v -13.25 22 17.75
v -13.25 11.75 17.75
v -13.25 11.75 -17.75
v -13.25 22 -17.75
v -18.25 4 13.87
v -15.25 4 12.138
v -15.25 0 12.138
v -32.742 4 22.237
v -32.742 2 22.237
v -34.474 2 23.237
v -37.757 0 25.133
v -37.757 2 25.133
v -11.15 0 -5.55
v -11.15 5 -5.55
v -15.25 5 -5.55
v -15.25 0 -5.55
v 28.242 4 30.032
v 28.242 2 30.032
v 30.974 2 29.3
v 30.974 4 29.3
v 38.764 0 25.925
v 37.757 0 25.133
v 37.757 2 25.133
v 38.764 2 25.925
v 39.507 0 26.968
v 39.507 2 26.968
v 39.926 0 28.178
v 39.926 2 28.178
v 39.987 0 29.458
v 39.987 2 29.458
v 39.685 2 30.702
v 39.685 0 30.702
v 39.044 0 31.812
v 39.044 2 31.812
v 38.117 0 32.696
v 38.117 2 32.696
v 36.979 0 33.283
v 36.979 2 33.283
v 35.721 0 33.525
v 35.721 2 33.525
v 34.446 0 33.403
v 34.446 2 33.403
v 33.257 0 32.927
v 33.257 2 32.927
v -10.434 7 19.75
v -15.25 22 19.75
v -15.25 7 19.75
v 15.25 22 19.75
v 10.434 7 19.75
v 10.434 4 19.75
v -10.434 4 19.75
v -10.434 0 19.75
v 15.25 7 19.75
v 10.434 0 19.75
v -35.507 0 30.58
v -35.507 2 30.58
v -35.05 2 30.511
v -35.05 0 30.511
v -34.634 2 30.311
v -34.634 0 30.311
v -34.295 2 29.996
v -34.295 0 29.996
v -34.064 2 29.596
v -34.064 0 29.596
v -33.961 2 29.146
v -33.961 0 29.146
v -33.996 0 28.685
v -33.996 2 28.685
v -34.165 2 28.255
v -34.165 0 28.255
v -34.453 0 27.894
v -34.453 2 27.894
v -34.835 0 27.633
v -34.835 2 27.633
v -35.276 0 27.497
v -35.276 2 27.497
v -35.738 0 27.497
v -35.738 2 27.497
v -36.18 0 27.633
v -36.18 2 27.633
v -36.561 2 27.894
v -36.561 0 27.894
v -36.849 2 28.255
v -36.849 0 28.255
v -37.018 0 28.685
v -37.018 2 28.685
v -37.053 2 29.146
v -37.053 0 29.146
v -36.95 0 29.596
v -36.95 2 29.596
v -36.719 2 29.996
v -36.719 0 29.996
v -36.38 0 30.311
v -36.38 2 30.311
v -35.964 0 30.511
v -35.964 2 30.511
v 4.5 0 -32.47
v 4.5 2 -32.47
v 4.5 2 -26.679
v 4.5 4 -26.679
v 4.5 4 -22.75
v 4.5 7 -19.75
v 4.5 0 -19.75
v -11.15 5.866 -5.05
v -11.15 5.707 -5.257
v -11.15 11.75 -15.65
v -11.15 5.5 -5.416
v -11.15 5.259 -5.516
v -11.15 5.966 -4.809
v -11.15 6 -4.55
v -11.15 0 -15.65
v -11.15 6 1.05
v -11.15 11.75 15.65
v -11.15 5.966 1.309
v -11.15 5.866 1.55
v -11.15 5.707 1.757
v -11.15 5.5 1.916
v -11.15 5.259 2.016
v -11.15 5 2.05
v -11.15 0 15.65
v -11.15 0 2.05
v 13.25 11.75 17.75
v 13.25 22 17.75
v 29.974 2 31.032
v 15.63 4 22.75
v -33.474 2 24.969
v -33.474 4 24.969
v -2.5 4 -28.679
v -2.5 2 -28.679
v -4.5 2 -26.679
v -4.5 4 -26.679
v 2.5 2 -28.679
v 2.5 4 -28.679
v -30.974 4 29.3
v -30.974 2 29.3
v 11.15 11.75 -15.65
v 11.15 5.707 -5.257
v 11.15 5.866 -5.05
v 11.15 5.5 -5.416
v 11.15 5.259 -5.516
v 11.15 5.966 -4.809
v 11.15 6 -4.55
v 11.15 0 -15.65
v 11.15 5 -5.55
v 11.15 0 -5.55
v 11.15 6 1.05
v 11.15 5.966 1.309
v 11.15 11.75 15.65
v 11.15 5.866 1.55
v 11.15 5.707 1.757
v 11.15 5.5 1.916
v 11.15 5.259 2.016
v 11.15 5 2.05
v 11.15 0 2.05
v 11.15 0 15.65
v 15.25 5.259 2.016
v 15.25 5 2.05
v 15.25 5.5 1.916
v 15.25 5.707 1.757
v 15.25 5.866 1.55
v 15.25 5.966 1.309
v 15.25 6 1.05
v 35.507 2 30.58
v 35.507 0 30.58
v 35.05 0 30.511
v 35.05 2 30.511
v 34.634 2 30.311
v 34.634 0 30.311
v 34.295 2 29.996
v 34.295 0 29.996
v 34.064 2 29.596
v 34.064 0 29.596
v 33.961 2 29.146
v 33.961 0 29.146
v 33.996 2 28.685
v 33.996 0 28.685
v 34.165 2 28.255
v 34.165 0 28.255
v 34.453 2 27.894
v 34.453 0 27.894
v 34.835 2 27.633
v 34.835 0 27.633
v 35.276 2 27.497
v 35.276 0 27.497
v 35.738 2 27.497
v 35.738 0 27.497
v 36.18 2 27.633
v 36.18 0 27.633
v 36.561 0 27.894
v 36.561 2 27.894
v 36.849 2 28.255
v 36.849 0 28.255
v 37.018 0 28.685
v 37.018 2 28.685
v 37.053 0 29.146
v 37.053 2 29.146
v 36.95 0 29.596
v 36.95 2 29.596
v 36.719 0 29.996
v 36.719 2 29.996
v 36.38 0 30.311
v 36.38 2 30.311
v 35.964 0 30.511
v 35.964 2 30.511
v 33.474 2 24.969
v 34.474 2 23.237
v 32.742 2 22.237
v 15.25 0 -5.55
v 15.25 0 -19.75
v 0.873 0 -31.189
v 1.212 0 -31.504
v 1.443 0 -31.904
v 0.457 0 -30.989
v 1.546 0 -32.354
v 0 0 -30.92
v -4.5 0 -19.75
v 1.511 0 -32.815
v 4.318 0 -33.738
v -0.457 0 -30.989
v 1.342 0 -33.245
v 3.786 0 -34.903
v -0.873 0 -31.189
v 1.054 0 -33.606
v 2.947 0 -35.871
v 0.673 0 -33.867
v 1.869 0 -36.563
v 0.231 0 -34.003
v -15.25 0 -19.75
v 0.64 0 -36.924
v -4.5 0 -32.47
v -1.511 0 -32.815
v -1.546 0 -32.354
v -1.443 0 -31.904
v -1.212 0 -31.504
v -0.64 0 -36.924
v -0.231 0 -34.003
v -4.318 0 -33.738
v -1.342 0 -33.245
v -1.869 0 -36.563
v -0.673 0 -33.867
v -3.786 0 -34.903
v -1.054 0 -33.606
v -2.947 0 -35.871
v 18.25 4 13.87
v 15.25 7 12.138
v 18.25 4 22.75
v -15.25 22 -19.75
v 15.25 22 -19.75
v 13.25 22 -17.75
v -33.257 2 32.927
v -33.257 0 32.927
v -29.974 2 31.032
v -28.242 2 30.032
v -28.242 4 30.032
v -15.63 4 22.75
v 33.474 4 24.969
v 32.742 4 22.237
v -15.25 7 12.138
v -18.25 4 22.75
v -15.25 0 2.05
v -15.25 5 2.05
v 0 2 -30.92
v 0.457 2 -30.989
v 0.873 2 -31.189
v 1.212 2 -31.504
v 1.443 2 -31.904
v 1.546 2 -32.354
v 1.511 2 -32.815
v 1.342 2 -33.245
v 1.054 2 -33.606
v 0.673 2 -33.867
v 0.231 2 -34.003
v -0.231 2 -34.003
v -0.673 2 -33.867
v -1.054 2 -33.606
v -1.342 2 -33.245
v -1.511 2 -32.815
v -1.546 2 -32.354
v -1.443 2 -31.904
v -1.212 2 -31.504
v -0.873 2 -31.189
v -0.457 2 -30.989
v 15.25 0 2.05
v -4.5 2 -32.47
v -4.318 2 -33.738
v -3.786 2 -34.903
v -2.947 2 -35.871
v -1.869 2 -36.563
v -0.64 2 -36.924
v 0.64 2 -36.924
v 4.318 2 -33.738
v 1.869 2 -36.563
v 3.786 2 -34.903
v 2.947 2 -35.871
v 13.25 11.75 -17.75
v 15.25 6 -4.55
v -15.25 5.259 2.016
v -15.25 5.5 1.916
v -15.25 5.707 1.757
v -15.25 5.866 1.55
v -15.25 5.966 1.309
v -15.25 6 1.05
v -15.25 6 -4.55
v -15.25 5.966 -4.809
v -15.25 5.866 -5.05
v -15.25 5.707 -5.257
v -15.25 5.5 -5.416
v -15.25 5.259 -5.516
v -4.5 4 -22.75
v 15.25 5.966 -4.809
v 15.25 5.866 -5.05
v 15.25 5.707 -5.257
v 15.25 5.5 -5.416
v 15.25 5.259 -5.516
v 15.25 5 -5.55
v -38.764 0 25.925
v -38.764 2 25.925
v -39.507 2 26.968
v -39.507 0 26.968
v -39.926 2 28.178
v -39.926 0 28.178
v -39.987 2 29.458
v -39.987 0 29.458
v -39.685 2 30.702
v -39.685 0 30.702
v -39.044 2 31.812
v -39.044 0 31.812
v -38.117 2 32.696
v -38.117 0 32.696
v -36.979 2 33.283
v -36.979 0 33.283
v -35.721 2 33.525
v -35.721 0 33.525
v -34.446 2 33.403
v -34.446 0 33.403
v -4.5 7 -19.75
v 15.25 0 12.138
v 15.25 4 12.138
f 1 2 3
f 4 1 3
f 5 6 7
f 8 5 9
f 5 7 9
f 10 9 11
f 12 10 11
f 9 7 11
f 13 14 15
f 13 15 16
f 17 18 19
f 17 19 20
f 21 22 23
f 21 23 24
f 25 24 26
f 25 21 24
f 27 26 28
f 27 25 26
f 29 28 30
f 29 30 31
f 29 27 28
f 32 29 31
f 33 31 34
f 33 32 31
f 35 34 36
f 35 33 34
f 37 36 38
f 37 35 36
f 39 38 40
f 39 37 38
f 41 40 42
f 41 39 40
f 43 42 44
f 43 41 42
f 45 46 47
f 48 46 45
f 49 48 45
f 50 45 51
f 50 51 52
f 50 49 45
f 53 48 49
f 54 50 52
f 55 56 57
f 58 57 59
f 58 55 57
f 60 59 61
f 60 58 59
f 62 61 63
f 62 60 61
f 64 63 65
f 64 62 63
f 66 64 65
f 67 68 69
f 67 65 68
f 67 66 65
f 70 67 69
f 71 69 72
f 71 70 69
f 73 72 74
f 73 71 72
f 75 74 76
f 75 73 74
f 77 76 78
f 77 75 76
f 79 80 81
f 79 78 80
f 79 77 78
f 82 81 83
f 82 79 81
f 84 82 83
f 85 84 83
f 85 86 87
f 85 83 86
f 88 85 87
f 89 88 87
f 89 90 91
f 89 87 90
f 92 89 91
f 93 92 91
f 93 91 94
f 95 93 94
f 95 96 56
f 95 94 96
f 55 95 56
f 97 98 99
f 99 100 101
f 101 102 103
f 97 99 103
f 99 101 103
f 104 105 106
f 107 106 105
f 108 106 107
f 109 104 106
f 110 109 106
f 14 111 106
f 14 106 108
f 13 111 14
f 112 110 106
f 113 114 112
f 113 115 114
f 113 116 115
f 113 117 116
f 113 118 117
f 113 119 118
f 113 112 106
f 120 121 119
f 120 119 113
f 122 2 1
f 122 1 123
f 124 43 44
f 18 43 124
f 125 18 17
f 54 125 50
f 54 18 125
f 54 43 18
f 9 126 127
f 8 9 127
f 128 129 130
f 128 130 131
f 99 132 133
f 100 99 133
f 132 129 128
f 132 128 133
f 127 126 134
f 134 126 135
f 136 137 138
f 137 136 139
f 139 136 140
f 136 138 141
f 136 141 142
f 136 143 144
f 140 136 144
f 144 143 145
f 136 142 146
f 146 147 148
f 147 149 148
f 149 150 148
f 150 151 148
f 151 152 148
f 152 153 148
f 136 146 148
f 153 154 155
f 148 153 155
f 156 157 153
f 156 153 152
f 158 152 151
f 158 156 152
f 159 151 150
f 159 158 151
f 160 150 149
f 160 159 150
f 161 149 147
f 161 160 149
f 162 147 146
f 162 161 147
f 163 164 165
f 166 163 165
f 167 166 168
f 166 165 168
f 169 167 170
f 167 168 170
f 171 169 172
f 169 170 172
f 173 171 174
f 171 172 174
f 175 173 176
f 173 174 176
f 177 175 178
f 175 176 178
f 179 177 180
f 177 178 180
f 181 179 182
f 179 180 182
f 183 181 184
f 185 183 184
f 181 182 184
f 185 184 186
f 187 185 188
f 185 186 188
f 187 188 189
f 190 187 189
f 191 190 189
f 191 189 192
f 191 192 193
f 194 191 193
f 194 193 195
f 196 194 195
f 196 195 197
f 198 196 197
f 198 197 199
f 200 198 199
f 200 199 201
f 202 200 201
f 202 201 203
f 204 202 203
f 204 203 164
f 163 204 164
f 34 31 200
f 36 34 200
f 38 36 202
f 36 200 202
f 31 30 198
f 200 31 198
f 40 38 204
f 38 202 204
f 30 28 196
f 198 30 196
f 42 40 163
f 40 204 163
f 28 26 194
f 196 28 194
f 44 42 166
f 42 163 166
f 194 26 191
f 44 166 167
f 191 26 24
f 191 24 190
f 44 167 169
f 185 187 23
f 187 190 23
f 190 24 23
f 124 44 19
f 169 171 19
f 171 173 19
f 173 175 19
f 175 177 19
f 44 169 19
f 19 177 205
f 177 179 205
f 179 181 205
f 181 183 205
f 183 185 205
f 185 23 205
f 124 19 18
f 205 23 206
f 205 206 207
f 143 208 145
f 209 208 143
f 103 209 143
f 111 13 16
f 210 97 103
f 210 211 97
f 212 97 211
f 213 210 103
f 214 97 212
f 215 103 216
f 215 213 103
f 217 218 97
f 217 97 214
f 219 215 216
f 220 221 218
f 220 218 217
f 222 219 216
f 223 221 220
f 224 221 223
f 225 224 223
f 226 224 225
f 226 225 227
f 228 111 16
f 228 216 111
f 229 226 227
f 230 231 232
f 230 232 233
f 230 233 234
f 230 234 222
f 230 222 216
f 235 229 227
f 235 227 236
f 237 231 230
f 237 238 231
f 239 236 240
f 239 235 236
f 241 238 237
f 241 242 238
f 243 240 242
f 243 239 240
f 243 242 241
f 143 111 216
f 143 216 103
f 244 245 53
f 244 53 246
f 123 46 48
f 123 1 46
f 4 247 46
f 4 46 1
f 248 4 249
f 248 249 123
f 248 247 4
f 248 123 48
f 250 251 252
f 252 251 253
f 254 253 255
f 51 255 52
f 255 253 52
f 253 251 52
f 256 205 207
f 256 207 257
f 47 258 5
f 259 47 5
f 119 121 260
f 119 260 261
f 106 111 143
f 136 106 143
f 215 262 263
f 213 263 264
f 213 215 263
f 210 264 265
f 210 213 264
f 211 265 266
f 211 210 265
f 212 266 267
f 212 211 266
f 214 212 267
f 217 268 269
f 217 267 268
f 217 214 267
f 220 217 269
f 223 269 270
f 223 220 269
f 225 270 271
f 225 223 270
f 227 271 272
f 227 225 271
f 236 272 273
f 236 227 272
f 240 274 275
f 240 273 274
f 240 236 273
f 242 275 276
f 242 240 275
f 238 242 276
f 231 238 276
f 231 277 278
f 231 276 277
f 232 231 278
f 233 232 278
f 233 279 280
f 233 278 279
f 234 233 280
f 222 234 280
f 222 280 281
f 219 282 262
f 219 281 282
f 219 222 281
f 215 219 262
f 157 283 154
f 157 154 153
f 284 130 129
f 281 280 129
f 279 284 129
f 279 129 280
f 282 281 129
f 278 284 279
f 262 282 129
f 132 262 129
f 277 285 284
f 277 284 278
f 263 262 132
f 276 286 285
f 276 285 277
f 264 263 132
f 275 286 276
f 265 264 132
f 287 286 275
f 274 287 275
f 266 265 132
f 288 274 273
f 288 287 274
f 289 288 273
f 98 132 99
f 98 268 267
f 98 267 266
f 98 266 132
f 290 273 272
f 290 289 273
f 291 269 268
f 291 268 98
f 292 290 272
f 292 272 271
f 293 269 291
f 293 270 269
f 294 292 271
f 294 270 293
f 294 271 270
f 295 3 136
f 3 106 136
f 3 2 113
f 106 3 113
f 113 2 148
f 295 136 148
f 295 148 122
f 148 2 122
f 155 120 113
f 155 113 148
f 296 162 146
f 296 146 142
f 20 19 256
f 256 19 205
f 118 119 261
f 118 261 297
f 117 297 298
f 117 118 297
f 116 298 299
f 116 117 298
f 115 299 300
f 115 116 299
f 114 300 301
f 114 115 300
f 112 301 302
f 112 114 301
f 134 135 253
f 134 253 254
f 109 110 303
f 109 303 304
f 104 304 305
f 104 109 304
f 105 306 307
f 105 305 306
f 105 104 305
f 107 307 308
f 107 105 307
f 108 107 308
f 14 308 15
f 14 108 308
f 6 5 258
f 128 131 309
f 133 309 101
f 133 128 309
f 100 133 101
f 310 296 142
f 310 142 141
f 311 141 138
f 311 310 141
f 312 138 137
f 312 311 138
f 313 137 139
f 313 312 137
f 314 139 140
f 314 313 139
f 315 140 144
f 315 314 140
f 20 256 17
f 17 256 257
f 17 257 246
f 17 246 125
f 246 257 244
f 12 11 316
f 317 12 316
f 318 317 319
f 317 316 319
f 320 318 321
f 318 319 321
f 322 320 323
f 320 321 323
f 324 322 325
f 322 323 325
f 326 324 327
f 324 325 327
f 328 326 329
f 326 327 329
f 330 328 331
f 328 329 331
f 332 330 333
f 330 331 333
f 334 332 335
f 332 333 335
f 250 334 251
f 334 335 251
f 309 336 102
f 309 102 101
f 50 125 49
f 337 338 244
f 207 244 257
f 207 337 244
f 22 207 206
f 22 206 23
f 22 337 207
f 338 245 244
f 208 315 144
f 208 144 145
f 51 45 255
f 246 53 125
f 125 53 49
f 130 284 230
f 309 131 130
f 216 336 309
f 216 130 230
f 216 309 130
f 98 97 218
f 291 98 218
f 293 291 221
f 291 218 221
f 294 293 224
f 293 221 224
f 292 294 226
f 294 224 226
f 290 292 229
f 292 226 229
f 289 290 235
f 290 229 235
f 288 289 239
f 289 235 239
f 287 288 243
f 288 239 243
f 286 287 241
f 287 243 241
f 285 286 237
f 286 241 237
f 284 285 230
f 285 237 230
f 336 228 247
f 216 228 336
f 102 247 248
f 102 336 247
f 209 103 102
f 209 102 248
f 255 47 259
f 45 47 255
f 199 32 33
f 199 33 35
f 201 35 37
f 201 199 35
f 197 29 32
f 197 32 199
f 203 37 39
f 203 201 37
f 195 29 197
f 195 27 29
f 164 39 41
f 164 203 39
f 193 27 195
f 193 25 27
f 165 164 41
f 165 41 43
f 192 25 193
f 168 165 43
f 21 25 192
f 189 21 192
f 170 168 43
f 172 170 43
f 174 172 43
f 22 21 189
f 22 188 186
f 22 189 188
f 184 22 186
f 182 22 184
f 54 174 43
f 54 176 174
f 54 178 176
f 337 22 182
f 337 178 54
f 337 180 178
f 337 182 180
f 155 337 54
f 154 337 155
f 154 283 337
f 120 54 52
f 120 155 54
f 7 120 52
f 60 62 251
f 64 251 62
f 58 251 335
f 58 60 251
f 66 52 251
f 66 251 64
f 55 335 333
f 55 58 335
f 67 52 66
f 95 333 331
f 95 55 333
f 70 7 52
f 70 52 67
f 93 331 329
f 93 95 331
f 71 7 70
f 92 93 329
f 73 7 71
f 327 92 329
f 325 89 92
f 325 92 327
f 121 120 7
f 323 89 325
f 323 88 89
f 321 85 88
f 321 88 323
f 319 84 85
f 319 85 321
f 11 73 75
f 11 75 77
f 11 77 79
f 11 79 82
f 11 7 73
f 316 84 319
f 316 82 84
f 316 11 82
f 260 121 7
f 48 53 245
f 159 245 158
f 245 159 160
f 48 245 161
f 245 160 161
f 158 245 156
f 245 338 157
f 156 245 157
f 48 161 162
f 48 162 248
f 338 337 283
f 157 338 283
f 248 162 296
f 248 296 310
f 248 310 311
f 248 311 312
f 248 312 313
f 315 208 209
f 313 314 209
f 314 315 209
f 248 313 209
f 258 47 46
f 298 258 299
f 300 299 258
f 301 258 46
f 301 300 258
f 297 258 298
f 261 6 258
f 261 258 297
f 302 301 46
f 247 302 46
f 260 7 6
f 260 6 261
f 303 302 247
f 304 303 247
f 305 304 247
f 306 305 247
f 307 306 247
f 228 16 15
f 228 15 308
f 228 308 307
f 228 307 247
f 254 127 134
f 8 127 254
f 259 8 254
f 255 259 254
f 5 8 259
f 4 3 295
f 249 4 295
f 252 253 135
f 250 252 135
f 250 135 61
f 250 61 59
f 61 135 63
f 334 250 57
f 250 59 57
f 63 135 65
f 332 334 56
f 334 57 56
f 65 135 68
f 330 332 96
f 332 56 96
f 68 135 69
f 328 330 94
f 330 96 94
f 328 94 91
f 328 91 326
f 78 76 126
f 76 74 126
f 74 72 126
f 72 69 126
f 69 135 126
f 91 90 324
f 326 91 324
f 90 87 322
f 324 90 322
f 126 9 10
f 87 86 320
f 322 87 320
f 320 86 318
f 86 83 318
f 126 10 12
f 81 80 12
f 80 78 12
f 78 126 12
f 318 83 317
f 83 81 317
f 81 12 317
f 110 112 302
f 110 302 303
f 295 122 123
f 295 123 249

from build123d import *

# Parameters (mm, degrees)
SKETCH1_W           = 30.5
SKETCH1_H           = 39.5
SKETCH1_W_2         = 26.5
SKETCH1_H_2         = 35.5
BOSS_EXTRUDE1_DEPTH = 22
SKETCH3_W           = 26.5
SKETCH3_H           = 35.5
SKETCH3_W_2         = 22.3
SKETCH3_H_2         = 31.3
BOSS_EXTRUDE3_DEPTH = 11.75
BOSS_EXTRUDE4_START = -22
SKETCH4_R           = 1.55
BOSS_EXTRUDE4_DEPTH = 4
CUT_EXTRUDE1_DEPTH  = 2
CHAMFER2_SIZE       = 3
CUT_EXTRUDE2_DEPTH  = 71.029433394
CUT_EXTRUDE3_START  = -2
CUT_EXTRUDE3_DEPTH  = 2
CHAMFER3_SIZE       = 2


with BuildPart() as part:
    # Sketch1 → Boss-Extrude1 (new body)
    with BuildSketch(Plane(origin=(0, 0, 0), x_dir=(1, 0, 0), z_dir=(0, 1, 0))):
        Rectangle(SKETCH1_W, SKETCH1_H)
        Rectangle(SKETCH1_W_2, SKETCH1_H_2, mode=Mode.SUBTRACT)
    extrude(amount=BOSS_EXTRUDE1_DEPTH)

    # Sketch3 → Boss-Extrude3 (add)
    with BuildSketch(Plane.XZ):
        Rectangle(SKETCH3_W, SKETCH3_H)
        Rectangle(SKETCH3_W_2, SKETCH3_H_2, mode=Mode.SUBTRACT)
    extrude(amount=-BOSS_EXTRUDE3_DEPTH)

    # Sketch4 → Boss-Extrude4 (add)
    # profile 1 of 2: a face of its own
    with BuildSketch(Plane(origin=(0, 22, 0), x_dir=(1, 0, 0), z_dir=(0, 1, 0)).offset(BOSS_EXTRUDE4_START)):
        with BuildLine():
            Line((-33.257041555, -32.927114317), (-10.433610061, -19.75))
            Line((-10.433610061, -19.75), (-15.25, -19.75))
            Line((-15.25, -19.75), (-15.25, -12.138439182))
            Line((-15.25, -12.138439182), (-37.757041555, -25.132885683))
            ThreePointArc((-37.757041555, -25.132885683), (-39.404155872, -31.28), (-33.257041555, -32.927114317))
        make_face()
        with Locations(Location((-35.507041555, -29.03, 0), (0, 0, 270))):
            Circle(SKETCH4_R, mode=Mode.SUBTRACT)
    # profile 2 of 2: a face of its own
    with BuildSketch(Plane(origin=(0, 22, 0), x_dir=(1, 0, 0), z_dir=(0, 1, 0)).offset(BOSS_EXTRUDE4_START)):
        with BuildLine():
            Line((-4.5, 19.75), (4.5, 19.75))
            Line((4.5, 19.75), (4.5, 32.47))
            ThreePointArc((4.5, 32.47), (0, 36.97), (-4.5, 32.47))
            Line((-4.5, 32.47), (-4.5, 19.75))
        make_face()
        with Locations(Location((0, 32.47, 0), (0, 0, 270))):
            Circle(SKETCH4_R, mode=Mode.SUBTRACT)
    boss_extrude4 = extrude(amount=BOSS_EXTRUDE4_DEPTH)

    # Sketch6 → Cut-Extrude1 (cut)
    with BuildSketch(Plane(origin=(0, 4, 0), x_dir=(1, 0, 0), z_dir=(0, 1, 0))):
        Polygon((-2.85, 34.115448267), (-2.85, 30.824551733), (0, 29.179103466), (2.85, 30.824551733), (2.85, 34.115448267), (0, 35.760896534), align=None)
        Polygon((-35.507041555, -32.320896534), (-32.657041555, -30.675448267), (-32.657041555, -27.384551733), (-35.507041555, -25.739103466), (-38.357041555, -27.384551733), (-38.357041555, -30.675448267), align=None)
    cut_extrude1 = extrude(amount=-CUT_EXTRUDE1_DEPTH, mode=Mode.SUBTRACT)

    # Mirror1: Boss-Extrude4, Cut-Extrude1 across plane
    add(boss_extrude4.mirror(Plane(origin=(0, 0, 0), x_dir=(0, 0, 1), z_dir=(1, 0, 0))))
    add(cut_extrude1.mirror(Plane(origin=(0, 0, 0), x_dir=(0, 0, 1), z_dir=(1, 0, 0))), mode=Mode.SUBTRACT)

    # Chamfer2
    # the kernel refuses this chamfer: 3 mm, written as the material it adds along each edge
    with BuildSketch(Plane(origin=(15.25, 4, 19.75), x_dir=(0, 1, 0), z_dir=(0, 0, -1))) as chamfer2_piece_1_section:
        Polygon((CHAMFER2_SIZE, 0), (0, CHAMFER2_SIZE), (0, 0), align=None)
    chamfer2_piece_1 = extrude(amount=15.326609781, mode=Mode.PRIVATE)
    chamfer2_piece_1 = split(chamfer2_piece_1, bisect_by=Plane(origin=(18.545902515, 4, 14.041329387), z_dir=(-0.4999999999999982, 0, 0.8660254037844397)), keep=Keep.TOP, mode=Mode.PRIVATE)
    add(chamfer2_piece_1)
    with BuildSketch(Plane(origin=(2.718561097, 4, 19.75), x_dir=(0, 1, 0), z_dir=(1, 0, 0))) as chamfer2_piece_2_section:
        Polygon((CHAMFER2_SIZE, 0), (0, CHAMFER2_SIZE), (0, 0), align=None)
    chamfer2_piece_2 = extrude(amount=12.531438903, mode=Mode.PRIVATE)
    chamfer2_piece_2 = split(chamfer2_piece_2, bisect_by=Plane(origin=(4.647323338, 4, 16.409285803), z_dir=(0.4999999999999978, 0, -0.8660254037844399)), keep=Keep.TOP, mode=Mode.PRIVATE)
    add(chamfer2_piece_2)
    with BuildSketch(Plane(origin=(-4.5, 4, -19.75), x_dir=(0, 1, 0), z_dir=(1, 0, 0))) as chamfer2_piece_3:
        Polygon((CHAMFER2_SIZE, 0), (0, -CHAMFER2_SIZE), (0, 0), align=None)
    extrude(amount=9)
    with BuildSketch(Plane(origin=(-15.25, 4, 19.75), x_dir=(0, 1, 0), z_dir=(0, 0, -1))) as chamfer2_piece_4_section:
        Polygon((CHAMFER2_SIZE, 0), (0, -CHAMFER2_SIZE), (0, 0), align=None)
    chamfer2_piece_4 = extrude(amount=15.326609781, mode=Mode.PRIVATE)
    chamfer2_piece_4 = split(chamfer2_piece_4, bisect_by=Plane(origin=(-18.545902515, 4, 14.041329387), z_dir=(0.4999999999999982, 0, 0.8660254037844397)), keep=Keep.TOP, mode=Mode.PRIVATE)
    add(chamfer2_piece_4)
    with BuildSketch(Plane(origin=(-2.718561097, 4, 19.75), x_dir=(0, 1, 0), z_dir=(-1, 0, 0))) as chamfer2_piece_5_section:
        Polygon((CHAMFER2_SIZE, 0), (0, -CHAMFER2_SIZE), (0, 0), align=None)
    chamfer2_piece_5 = extrude(amount=12.531438903, mode=Mode.PRIVATE)
    chamfer2_piece_5 = split(chamfer2_piece_5, bisect_by=Plane(origin=(-4.647323338, 4, 16.409285803), z_dir=(-0.4999999999999978, 0, -0.8660254037844399)), keep=Keep.TOP, mode=Mode.PRIVATE)
    add(chamfer2_piece_5)
    with BuildSketch(Plane(origin=(15.25, 4, 27.465048964), x_dir=(0, 1, 0), z_dir=(0, 0, -1))) as chamfer2_piece_6a_section:
        Polygon((CHAMFER2_SIZE, 0), (0, CHAMFER2_SIZE), (0, 0), align=None)
    chamfer2_piece_6a = extrude(amount=23.041658745, mode=Mode.PRIVATE)
    chamfer2_piece_6a = split(chamfer2_piece_6a, bisect_by=Plane(origin=(15.25, 4, 19.75), z_dir=(0, 0, 1)), keep=Keep.TOP, mode=Mode.PRIVATE)
    chamfer2_piece_6a = split(chamfer2_piece_6a, bisect_by=Plane(origin=(17.386616712, 4, 23.764320262), z_dir=(0.4999999999999978, 0, -0.8660254037844399)), keep=Keep.TOP, mode=Mode.PRIVATE)
    with BuildSketch(Plane(origin=(2.718561097, 4, 19.75), x_dir=(0, 1, 0), z_dir=(1, 0, 0))) as chamfer2_piece_6b_section:
        Polygon((CHAMFER2_SIZE, 0), (0, CHAMFER2_SIZE), (0, 0), align=None)
    chamfer2_piece_6b = extrude(amount=20.246487867, mode=Mode.PRIVATE)
    chamfer2_piece_6b = split(chamfer2_piece_6b, bisect_by=Plane(origin=(15.25, 4, 19.75), z_dir=(1, 0, 0)), keep=Keep.TOP, mode=Mode.PRIVATE)
    chamfer2_piece_6b = split(chamfer2_piece_6b, bisect_by=Plane(origin=(4.647323338, 4, 16.409285803), z_dir=(0.4999999999999978, 0, -0.8660254037844399)), keep=Keep.TOP, mode=Mode.PRIVATE)
    chamfer2_piece_6 = chamfer2_piece_6a & chamfer2_piece_6b
    add(chamfer2_piece_6)
    with BuildSketch(Plane(origin=(-15.25, 4, 27.465048964), x_dir=(0, 1, 0), z_dir=(0, 0, -1))) as chamfer2_piece_7a_section:
        Polygon((CHAMFER2_SIZE, 0), (0, -CHAMFER2_SIZE), (0, 0), align=None)
    chamfer2_piece_7a = extrude(amount=23.041658745, mode=Mode.PRIVATE)
    chamfer2_piece_7a = split(chamfer2_piece_7a, bisect_by=Plane(origin=(-17.386616712, 4, 23.764320262), z_dir=(-0.4999999999999978, 0, -0.8660254037844399)), keep=Keep.TOP, mode=Mode.PRIVATE)
    chamfer2_piece_7a = split(chamfer2_piece_7a, bisect_by=Plane(origin=(-15.25, 4, 19.75), z_dir=(0, 0, 1)), keep=Keep.TOP, mode=Mode.PRIVATE)
    with BuildSketch(Plane(origin=(-2.718561097, 4, 19.75), x_dir=(0, 1, 0), z_dir=(-1, 0, 0))) as chamfer2_piece_7b_section:
        Polygon((CHAMFER2_SIZE, 0), (0, -CHAMFER2_SIZE), (0, 0), align=None)
    chamfer2_piece_7b = extrude(amount=20.246487867, mode=Mode.PRIVATE)
    chamfer2_piece_7b = split(chamfer2_piece_7b, bisect_by=Plane(origin=(-15.25, 4, 19.75), z_dir=(-1, 0, 0)), keep=Keep.TOP, mode=Mode.PRIVATE)
    chamfer2_piece_7b = split(chamfer2_piece_7b, bisect_by=Plane(origin=(-4.647323338, 4, 16.409285803), z_dir=(-0.4999999999999978, 0, -0.8660254037844399)), keep=Keep.TOP, mode=Mode.PRIVATE)
    chamfer2_piece_7 = chamfer2_piece_7a & chamfer2_piece_7b
    add(chamfer2_piece_7)

    # Sketch7 → Cut-Extrude2 (cut, through all)
    with BuildSketch(Plane(origin=(15.25, 0, 0), x_dir=(0, 0, -1), z_dir=(1, 0, 0))):
        with BuildLine():
            Line((5.55, 0), (-2.05, 0))
            Line((-2.05, 0), (-2.05, 5))
            ThreePointArc((-2.05, 5), (-1.757106781, 5.707106781), (-1.05, 6))
            Line((-1.05, 6), (4.55, 6))
            ThreePointArc((4.55, 6), (5.257106781, 5.707106781), (5.55, 5))
            Line((5.55, 5), (5.55, 0))
        make_face()
    extrude(amount=-CUT_EXTRUDE2_DEPTH, mode=Mode.SUBTRACT)

    # Sketch8 → Cut-Extrude3 (cut)
    with BuildSketch(Plane(origin=(0, 4, 0), x_dir=(1, 0, 0), z_dir=(0, 1, 0)).offset(CUT_EXTRUDE3_START)):
        with BuildLine():
            Line((-34.474028853, -23.237437416), (-29.974028853, -31.03166605))
            Line((-29.974028853, -31.03166605), (-33.257041555, -32.927114317))
            ThreePointArc((-33.257041555, -32.927114317), (-39.404155872, -31.28), (-37.757041555, -25.132885683))
            Line((-37.757041555, -25.132885683), (-34.474028853, -23.237437416))
        make_face()
        with BuildLine():
            Line((4.5, 28.679103466), (4.5, 32.47))
            ThreePointArc((4.5, 32.47), (0, 36.97), (-4.5, 32.47))
            Line((-4.5, 32.47), (-4.5, 28.679103466))
            Line((-4.5, 28.679103466), (4.5, 28.679103466))
        make_face()
        with BuildLine():
            Line((33.257041555, -32.927114317), (29.974028853, -31.03166605))
            Line((29.974028853, -31.03166605), (34.474028853, -23.237437416))
            Line((34.474028853, -23.237437416), (37.757041555, -25.132885683))
            ThreePointArc((37.757041555, -25.132885683), (39.404155872, -31.28), (33.257041555, -32.927114317))
        make_face()
    extrude(amount=CUT_EXTRUDE3_DEPTH, mode=Mode.SUBTRACT)

    # Chamfer3
    chamfer3_edges = [part.edges().sort_by_distance(p)[0] for p in [
        (-34.474028853, 3, 23.237437416),
        (-29.974028853, 3, 31.03166605),
        (4.5, 3, -28.679103466),
        (-4.5, 3, -28.679103466),
        (29.974028853, 3, 31.03166605),
        (34.474028853, 3, 23.237437416),
    ]]
    chamfer(chamfer3_edges, length=CHAMFER3_SIZE)


solid = part.part
